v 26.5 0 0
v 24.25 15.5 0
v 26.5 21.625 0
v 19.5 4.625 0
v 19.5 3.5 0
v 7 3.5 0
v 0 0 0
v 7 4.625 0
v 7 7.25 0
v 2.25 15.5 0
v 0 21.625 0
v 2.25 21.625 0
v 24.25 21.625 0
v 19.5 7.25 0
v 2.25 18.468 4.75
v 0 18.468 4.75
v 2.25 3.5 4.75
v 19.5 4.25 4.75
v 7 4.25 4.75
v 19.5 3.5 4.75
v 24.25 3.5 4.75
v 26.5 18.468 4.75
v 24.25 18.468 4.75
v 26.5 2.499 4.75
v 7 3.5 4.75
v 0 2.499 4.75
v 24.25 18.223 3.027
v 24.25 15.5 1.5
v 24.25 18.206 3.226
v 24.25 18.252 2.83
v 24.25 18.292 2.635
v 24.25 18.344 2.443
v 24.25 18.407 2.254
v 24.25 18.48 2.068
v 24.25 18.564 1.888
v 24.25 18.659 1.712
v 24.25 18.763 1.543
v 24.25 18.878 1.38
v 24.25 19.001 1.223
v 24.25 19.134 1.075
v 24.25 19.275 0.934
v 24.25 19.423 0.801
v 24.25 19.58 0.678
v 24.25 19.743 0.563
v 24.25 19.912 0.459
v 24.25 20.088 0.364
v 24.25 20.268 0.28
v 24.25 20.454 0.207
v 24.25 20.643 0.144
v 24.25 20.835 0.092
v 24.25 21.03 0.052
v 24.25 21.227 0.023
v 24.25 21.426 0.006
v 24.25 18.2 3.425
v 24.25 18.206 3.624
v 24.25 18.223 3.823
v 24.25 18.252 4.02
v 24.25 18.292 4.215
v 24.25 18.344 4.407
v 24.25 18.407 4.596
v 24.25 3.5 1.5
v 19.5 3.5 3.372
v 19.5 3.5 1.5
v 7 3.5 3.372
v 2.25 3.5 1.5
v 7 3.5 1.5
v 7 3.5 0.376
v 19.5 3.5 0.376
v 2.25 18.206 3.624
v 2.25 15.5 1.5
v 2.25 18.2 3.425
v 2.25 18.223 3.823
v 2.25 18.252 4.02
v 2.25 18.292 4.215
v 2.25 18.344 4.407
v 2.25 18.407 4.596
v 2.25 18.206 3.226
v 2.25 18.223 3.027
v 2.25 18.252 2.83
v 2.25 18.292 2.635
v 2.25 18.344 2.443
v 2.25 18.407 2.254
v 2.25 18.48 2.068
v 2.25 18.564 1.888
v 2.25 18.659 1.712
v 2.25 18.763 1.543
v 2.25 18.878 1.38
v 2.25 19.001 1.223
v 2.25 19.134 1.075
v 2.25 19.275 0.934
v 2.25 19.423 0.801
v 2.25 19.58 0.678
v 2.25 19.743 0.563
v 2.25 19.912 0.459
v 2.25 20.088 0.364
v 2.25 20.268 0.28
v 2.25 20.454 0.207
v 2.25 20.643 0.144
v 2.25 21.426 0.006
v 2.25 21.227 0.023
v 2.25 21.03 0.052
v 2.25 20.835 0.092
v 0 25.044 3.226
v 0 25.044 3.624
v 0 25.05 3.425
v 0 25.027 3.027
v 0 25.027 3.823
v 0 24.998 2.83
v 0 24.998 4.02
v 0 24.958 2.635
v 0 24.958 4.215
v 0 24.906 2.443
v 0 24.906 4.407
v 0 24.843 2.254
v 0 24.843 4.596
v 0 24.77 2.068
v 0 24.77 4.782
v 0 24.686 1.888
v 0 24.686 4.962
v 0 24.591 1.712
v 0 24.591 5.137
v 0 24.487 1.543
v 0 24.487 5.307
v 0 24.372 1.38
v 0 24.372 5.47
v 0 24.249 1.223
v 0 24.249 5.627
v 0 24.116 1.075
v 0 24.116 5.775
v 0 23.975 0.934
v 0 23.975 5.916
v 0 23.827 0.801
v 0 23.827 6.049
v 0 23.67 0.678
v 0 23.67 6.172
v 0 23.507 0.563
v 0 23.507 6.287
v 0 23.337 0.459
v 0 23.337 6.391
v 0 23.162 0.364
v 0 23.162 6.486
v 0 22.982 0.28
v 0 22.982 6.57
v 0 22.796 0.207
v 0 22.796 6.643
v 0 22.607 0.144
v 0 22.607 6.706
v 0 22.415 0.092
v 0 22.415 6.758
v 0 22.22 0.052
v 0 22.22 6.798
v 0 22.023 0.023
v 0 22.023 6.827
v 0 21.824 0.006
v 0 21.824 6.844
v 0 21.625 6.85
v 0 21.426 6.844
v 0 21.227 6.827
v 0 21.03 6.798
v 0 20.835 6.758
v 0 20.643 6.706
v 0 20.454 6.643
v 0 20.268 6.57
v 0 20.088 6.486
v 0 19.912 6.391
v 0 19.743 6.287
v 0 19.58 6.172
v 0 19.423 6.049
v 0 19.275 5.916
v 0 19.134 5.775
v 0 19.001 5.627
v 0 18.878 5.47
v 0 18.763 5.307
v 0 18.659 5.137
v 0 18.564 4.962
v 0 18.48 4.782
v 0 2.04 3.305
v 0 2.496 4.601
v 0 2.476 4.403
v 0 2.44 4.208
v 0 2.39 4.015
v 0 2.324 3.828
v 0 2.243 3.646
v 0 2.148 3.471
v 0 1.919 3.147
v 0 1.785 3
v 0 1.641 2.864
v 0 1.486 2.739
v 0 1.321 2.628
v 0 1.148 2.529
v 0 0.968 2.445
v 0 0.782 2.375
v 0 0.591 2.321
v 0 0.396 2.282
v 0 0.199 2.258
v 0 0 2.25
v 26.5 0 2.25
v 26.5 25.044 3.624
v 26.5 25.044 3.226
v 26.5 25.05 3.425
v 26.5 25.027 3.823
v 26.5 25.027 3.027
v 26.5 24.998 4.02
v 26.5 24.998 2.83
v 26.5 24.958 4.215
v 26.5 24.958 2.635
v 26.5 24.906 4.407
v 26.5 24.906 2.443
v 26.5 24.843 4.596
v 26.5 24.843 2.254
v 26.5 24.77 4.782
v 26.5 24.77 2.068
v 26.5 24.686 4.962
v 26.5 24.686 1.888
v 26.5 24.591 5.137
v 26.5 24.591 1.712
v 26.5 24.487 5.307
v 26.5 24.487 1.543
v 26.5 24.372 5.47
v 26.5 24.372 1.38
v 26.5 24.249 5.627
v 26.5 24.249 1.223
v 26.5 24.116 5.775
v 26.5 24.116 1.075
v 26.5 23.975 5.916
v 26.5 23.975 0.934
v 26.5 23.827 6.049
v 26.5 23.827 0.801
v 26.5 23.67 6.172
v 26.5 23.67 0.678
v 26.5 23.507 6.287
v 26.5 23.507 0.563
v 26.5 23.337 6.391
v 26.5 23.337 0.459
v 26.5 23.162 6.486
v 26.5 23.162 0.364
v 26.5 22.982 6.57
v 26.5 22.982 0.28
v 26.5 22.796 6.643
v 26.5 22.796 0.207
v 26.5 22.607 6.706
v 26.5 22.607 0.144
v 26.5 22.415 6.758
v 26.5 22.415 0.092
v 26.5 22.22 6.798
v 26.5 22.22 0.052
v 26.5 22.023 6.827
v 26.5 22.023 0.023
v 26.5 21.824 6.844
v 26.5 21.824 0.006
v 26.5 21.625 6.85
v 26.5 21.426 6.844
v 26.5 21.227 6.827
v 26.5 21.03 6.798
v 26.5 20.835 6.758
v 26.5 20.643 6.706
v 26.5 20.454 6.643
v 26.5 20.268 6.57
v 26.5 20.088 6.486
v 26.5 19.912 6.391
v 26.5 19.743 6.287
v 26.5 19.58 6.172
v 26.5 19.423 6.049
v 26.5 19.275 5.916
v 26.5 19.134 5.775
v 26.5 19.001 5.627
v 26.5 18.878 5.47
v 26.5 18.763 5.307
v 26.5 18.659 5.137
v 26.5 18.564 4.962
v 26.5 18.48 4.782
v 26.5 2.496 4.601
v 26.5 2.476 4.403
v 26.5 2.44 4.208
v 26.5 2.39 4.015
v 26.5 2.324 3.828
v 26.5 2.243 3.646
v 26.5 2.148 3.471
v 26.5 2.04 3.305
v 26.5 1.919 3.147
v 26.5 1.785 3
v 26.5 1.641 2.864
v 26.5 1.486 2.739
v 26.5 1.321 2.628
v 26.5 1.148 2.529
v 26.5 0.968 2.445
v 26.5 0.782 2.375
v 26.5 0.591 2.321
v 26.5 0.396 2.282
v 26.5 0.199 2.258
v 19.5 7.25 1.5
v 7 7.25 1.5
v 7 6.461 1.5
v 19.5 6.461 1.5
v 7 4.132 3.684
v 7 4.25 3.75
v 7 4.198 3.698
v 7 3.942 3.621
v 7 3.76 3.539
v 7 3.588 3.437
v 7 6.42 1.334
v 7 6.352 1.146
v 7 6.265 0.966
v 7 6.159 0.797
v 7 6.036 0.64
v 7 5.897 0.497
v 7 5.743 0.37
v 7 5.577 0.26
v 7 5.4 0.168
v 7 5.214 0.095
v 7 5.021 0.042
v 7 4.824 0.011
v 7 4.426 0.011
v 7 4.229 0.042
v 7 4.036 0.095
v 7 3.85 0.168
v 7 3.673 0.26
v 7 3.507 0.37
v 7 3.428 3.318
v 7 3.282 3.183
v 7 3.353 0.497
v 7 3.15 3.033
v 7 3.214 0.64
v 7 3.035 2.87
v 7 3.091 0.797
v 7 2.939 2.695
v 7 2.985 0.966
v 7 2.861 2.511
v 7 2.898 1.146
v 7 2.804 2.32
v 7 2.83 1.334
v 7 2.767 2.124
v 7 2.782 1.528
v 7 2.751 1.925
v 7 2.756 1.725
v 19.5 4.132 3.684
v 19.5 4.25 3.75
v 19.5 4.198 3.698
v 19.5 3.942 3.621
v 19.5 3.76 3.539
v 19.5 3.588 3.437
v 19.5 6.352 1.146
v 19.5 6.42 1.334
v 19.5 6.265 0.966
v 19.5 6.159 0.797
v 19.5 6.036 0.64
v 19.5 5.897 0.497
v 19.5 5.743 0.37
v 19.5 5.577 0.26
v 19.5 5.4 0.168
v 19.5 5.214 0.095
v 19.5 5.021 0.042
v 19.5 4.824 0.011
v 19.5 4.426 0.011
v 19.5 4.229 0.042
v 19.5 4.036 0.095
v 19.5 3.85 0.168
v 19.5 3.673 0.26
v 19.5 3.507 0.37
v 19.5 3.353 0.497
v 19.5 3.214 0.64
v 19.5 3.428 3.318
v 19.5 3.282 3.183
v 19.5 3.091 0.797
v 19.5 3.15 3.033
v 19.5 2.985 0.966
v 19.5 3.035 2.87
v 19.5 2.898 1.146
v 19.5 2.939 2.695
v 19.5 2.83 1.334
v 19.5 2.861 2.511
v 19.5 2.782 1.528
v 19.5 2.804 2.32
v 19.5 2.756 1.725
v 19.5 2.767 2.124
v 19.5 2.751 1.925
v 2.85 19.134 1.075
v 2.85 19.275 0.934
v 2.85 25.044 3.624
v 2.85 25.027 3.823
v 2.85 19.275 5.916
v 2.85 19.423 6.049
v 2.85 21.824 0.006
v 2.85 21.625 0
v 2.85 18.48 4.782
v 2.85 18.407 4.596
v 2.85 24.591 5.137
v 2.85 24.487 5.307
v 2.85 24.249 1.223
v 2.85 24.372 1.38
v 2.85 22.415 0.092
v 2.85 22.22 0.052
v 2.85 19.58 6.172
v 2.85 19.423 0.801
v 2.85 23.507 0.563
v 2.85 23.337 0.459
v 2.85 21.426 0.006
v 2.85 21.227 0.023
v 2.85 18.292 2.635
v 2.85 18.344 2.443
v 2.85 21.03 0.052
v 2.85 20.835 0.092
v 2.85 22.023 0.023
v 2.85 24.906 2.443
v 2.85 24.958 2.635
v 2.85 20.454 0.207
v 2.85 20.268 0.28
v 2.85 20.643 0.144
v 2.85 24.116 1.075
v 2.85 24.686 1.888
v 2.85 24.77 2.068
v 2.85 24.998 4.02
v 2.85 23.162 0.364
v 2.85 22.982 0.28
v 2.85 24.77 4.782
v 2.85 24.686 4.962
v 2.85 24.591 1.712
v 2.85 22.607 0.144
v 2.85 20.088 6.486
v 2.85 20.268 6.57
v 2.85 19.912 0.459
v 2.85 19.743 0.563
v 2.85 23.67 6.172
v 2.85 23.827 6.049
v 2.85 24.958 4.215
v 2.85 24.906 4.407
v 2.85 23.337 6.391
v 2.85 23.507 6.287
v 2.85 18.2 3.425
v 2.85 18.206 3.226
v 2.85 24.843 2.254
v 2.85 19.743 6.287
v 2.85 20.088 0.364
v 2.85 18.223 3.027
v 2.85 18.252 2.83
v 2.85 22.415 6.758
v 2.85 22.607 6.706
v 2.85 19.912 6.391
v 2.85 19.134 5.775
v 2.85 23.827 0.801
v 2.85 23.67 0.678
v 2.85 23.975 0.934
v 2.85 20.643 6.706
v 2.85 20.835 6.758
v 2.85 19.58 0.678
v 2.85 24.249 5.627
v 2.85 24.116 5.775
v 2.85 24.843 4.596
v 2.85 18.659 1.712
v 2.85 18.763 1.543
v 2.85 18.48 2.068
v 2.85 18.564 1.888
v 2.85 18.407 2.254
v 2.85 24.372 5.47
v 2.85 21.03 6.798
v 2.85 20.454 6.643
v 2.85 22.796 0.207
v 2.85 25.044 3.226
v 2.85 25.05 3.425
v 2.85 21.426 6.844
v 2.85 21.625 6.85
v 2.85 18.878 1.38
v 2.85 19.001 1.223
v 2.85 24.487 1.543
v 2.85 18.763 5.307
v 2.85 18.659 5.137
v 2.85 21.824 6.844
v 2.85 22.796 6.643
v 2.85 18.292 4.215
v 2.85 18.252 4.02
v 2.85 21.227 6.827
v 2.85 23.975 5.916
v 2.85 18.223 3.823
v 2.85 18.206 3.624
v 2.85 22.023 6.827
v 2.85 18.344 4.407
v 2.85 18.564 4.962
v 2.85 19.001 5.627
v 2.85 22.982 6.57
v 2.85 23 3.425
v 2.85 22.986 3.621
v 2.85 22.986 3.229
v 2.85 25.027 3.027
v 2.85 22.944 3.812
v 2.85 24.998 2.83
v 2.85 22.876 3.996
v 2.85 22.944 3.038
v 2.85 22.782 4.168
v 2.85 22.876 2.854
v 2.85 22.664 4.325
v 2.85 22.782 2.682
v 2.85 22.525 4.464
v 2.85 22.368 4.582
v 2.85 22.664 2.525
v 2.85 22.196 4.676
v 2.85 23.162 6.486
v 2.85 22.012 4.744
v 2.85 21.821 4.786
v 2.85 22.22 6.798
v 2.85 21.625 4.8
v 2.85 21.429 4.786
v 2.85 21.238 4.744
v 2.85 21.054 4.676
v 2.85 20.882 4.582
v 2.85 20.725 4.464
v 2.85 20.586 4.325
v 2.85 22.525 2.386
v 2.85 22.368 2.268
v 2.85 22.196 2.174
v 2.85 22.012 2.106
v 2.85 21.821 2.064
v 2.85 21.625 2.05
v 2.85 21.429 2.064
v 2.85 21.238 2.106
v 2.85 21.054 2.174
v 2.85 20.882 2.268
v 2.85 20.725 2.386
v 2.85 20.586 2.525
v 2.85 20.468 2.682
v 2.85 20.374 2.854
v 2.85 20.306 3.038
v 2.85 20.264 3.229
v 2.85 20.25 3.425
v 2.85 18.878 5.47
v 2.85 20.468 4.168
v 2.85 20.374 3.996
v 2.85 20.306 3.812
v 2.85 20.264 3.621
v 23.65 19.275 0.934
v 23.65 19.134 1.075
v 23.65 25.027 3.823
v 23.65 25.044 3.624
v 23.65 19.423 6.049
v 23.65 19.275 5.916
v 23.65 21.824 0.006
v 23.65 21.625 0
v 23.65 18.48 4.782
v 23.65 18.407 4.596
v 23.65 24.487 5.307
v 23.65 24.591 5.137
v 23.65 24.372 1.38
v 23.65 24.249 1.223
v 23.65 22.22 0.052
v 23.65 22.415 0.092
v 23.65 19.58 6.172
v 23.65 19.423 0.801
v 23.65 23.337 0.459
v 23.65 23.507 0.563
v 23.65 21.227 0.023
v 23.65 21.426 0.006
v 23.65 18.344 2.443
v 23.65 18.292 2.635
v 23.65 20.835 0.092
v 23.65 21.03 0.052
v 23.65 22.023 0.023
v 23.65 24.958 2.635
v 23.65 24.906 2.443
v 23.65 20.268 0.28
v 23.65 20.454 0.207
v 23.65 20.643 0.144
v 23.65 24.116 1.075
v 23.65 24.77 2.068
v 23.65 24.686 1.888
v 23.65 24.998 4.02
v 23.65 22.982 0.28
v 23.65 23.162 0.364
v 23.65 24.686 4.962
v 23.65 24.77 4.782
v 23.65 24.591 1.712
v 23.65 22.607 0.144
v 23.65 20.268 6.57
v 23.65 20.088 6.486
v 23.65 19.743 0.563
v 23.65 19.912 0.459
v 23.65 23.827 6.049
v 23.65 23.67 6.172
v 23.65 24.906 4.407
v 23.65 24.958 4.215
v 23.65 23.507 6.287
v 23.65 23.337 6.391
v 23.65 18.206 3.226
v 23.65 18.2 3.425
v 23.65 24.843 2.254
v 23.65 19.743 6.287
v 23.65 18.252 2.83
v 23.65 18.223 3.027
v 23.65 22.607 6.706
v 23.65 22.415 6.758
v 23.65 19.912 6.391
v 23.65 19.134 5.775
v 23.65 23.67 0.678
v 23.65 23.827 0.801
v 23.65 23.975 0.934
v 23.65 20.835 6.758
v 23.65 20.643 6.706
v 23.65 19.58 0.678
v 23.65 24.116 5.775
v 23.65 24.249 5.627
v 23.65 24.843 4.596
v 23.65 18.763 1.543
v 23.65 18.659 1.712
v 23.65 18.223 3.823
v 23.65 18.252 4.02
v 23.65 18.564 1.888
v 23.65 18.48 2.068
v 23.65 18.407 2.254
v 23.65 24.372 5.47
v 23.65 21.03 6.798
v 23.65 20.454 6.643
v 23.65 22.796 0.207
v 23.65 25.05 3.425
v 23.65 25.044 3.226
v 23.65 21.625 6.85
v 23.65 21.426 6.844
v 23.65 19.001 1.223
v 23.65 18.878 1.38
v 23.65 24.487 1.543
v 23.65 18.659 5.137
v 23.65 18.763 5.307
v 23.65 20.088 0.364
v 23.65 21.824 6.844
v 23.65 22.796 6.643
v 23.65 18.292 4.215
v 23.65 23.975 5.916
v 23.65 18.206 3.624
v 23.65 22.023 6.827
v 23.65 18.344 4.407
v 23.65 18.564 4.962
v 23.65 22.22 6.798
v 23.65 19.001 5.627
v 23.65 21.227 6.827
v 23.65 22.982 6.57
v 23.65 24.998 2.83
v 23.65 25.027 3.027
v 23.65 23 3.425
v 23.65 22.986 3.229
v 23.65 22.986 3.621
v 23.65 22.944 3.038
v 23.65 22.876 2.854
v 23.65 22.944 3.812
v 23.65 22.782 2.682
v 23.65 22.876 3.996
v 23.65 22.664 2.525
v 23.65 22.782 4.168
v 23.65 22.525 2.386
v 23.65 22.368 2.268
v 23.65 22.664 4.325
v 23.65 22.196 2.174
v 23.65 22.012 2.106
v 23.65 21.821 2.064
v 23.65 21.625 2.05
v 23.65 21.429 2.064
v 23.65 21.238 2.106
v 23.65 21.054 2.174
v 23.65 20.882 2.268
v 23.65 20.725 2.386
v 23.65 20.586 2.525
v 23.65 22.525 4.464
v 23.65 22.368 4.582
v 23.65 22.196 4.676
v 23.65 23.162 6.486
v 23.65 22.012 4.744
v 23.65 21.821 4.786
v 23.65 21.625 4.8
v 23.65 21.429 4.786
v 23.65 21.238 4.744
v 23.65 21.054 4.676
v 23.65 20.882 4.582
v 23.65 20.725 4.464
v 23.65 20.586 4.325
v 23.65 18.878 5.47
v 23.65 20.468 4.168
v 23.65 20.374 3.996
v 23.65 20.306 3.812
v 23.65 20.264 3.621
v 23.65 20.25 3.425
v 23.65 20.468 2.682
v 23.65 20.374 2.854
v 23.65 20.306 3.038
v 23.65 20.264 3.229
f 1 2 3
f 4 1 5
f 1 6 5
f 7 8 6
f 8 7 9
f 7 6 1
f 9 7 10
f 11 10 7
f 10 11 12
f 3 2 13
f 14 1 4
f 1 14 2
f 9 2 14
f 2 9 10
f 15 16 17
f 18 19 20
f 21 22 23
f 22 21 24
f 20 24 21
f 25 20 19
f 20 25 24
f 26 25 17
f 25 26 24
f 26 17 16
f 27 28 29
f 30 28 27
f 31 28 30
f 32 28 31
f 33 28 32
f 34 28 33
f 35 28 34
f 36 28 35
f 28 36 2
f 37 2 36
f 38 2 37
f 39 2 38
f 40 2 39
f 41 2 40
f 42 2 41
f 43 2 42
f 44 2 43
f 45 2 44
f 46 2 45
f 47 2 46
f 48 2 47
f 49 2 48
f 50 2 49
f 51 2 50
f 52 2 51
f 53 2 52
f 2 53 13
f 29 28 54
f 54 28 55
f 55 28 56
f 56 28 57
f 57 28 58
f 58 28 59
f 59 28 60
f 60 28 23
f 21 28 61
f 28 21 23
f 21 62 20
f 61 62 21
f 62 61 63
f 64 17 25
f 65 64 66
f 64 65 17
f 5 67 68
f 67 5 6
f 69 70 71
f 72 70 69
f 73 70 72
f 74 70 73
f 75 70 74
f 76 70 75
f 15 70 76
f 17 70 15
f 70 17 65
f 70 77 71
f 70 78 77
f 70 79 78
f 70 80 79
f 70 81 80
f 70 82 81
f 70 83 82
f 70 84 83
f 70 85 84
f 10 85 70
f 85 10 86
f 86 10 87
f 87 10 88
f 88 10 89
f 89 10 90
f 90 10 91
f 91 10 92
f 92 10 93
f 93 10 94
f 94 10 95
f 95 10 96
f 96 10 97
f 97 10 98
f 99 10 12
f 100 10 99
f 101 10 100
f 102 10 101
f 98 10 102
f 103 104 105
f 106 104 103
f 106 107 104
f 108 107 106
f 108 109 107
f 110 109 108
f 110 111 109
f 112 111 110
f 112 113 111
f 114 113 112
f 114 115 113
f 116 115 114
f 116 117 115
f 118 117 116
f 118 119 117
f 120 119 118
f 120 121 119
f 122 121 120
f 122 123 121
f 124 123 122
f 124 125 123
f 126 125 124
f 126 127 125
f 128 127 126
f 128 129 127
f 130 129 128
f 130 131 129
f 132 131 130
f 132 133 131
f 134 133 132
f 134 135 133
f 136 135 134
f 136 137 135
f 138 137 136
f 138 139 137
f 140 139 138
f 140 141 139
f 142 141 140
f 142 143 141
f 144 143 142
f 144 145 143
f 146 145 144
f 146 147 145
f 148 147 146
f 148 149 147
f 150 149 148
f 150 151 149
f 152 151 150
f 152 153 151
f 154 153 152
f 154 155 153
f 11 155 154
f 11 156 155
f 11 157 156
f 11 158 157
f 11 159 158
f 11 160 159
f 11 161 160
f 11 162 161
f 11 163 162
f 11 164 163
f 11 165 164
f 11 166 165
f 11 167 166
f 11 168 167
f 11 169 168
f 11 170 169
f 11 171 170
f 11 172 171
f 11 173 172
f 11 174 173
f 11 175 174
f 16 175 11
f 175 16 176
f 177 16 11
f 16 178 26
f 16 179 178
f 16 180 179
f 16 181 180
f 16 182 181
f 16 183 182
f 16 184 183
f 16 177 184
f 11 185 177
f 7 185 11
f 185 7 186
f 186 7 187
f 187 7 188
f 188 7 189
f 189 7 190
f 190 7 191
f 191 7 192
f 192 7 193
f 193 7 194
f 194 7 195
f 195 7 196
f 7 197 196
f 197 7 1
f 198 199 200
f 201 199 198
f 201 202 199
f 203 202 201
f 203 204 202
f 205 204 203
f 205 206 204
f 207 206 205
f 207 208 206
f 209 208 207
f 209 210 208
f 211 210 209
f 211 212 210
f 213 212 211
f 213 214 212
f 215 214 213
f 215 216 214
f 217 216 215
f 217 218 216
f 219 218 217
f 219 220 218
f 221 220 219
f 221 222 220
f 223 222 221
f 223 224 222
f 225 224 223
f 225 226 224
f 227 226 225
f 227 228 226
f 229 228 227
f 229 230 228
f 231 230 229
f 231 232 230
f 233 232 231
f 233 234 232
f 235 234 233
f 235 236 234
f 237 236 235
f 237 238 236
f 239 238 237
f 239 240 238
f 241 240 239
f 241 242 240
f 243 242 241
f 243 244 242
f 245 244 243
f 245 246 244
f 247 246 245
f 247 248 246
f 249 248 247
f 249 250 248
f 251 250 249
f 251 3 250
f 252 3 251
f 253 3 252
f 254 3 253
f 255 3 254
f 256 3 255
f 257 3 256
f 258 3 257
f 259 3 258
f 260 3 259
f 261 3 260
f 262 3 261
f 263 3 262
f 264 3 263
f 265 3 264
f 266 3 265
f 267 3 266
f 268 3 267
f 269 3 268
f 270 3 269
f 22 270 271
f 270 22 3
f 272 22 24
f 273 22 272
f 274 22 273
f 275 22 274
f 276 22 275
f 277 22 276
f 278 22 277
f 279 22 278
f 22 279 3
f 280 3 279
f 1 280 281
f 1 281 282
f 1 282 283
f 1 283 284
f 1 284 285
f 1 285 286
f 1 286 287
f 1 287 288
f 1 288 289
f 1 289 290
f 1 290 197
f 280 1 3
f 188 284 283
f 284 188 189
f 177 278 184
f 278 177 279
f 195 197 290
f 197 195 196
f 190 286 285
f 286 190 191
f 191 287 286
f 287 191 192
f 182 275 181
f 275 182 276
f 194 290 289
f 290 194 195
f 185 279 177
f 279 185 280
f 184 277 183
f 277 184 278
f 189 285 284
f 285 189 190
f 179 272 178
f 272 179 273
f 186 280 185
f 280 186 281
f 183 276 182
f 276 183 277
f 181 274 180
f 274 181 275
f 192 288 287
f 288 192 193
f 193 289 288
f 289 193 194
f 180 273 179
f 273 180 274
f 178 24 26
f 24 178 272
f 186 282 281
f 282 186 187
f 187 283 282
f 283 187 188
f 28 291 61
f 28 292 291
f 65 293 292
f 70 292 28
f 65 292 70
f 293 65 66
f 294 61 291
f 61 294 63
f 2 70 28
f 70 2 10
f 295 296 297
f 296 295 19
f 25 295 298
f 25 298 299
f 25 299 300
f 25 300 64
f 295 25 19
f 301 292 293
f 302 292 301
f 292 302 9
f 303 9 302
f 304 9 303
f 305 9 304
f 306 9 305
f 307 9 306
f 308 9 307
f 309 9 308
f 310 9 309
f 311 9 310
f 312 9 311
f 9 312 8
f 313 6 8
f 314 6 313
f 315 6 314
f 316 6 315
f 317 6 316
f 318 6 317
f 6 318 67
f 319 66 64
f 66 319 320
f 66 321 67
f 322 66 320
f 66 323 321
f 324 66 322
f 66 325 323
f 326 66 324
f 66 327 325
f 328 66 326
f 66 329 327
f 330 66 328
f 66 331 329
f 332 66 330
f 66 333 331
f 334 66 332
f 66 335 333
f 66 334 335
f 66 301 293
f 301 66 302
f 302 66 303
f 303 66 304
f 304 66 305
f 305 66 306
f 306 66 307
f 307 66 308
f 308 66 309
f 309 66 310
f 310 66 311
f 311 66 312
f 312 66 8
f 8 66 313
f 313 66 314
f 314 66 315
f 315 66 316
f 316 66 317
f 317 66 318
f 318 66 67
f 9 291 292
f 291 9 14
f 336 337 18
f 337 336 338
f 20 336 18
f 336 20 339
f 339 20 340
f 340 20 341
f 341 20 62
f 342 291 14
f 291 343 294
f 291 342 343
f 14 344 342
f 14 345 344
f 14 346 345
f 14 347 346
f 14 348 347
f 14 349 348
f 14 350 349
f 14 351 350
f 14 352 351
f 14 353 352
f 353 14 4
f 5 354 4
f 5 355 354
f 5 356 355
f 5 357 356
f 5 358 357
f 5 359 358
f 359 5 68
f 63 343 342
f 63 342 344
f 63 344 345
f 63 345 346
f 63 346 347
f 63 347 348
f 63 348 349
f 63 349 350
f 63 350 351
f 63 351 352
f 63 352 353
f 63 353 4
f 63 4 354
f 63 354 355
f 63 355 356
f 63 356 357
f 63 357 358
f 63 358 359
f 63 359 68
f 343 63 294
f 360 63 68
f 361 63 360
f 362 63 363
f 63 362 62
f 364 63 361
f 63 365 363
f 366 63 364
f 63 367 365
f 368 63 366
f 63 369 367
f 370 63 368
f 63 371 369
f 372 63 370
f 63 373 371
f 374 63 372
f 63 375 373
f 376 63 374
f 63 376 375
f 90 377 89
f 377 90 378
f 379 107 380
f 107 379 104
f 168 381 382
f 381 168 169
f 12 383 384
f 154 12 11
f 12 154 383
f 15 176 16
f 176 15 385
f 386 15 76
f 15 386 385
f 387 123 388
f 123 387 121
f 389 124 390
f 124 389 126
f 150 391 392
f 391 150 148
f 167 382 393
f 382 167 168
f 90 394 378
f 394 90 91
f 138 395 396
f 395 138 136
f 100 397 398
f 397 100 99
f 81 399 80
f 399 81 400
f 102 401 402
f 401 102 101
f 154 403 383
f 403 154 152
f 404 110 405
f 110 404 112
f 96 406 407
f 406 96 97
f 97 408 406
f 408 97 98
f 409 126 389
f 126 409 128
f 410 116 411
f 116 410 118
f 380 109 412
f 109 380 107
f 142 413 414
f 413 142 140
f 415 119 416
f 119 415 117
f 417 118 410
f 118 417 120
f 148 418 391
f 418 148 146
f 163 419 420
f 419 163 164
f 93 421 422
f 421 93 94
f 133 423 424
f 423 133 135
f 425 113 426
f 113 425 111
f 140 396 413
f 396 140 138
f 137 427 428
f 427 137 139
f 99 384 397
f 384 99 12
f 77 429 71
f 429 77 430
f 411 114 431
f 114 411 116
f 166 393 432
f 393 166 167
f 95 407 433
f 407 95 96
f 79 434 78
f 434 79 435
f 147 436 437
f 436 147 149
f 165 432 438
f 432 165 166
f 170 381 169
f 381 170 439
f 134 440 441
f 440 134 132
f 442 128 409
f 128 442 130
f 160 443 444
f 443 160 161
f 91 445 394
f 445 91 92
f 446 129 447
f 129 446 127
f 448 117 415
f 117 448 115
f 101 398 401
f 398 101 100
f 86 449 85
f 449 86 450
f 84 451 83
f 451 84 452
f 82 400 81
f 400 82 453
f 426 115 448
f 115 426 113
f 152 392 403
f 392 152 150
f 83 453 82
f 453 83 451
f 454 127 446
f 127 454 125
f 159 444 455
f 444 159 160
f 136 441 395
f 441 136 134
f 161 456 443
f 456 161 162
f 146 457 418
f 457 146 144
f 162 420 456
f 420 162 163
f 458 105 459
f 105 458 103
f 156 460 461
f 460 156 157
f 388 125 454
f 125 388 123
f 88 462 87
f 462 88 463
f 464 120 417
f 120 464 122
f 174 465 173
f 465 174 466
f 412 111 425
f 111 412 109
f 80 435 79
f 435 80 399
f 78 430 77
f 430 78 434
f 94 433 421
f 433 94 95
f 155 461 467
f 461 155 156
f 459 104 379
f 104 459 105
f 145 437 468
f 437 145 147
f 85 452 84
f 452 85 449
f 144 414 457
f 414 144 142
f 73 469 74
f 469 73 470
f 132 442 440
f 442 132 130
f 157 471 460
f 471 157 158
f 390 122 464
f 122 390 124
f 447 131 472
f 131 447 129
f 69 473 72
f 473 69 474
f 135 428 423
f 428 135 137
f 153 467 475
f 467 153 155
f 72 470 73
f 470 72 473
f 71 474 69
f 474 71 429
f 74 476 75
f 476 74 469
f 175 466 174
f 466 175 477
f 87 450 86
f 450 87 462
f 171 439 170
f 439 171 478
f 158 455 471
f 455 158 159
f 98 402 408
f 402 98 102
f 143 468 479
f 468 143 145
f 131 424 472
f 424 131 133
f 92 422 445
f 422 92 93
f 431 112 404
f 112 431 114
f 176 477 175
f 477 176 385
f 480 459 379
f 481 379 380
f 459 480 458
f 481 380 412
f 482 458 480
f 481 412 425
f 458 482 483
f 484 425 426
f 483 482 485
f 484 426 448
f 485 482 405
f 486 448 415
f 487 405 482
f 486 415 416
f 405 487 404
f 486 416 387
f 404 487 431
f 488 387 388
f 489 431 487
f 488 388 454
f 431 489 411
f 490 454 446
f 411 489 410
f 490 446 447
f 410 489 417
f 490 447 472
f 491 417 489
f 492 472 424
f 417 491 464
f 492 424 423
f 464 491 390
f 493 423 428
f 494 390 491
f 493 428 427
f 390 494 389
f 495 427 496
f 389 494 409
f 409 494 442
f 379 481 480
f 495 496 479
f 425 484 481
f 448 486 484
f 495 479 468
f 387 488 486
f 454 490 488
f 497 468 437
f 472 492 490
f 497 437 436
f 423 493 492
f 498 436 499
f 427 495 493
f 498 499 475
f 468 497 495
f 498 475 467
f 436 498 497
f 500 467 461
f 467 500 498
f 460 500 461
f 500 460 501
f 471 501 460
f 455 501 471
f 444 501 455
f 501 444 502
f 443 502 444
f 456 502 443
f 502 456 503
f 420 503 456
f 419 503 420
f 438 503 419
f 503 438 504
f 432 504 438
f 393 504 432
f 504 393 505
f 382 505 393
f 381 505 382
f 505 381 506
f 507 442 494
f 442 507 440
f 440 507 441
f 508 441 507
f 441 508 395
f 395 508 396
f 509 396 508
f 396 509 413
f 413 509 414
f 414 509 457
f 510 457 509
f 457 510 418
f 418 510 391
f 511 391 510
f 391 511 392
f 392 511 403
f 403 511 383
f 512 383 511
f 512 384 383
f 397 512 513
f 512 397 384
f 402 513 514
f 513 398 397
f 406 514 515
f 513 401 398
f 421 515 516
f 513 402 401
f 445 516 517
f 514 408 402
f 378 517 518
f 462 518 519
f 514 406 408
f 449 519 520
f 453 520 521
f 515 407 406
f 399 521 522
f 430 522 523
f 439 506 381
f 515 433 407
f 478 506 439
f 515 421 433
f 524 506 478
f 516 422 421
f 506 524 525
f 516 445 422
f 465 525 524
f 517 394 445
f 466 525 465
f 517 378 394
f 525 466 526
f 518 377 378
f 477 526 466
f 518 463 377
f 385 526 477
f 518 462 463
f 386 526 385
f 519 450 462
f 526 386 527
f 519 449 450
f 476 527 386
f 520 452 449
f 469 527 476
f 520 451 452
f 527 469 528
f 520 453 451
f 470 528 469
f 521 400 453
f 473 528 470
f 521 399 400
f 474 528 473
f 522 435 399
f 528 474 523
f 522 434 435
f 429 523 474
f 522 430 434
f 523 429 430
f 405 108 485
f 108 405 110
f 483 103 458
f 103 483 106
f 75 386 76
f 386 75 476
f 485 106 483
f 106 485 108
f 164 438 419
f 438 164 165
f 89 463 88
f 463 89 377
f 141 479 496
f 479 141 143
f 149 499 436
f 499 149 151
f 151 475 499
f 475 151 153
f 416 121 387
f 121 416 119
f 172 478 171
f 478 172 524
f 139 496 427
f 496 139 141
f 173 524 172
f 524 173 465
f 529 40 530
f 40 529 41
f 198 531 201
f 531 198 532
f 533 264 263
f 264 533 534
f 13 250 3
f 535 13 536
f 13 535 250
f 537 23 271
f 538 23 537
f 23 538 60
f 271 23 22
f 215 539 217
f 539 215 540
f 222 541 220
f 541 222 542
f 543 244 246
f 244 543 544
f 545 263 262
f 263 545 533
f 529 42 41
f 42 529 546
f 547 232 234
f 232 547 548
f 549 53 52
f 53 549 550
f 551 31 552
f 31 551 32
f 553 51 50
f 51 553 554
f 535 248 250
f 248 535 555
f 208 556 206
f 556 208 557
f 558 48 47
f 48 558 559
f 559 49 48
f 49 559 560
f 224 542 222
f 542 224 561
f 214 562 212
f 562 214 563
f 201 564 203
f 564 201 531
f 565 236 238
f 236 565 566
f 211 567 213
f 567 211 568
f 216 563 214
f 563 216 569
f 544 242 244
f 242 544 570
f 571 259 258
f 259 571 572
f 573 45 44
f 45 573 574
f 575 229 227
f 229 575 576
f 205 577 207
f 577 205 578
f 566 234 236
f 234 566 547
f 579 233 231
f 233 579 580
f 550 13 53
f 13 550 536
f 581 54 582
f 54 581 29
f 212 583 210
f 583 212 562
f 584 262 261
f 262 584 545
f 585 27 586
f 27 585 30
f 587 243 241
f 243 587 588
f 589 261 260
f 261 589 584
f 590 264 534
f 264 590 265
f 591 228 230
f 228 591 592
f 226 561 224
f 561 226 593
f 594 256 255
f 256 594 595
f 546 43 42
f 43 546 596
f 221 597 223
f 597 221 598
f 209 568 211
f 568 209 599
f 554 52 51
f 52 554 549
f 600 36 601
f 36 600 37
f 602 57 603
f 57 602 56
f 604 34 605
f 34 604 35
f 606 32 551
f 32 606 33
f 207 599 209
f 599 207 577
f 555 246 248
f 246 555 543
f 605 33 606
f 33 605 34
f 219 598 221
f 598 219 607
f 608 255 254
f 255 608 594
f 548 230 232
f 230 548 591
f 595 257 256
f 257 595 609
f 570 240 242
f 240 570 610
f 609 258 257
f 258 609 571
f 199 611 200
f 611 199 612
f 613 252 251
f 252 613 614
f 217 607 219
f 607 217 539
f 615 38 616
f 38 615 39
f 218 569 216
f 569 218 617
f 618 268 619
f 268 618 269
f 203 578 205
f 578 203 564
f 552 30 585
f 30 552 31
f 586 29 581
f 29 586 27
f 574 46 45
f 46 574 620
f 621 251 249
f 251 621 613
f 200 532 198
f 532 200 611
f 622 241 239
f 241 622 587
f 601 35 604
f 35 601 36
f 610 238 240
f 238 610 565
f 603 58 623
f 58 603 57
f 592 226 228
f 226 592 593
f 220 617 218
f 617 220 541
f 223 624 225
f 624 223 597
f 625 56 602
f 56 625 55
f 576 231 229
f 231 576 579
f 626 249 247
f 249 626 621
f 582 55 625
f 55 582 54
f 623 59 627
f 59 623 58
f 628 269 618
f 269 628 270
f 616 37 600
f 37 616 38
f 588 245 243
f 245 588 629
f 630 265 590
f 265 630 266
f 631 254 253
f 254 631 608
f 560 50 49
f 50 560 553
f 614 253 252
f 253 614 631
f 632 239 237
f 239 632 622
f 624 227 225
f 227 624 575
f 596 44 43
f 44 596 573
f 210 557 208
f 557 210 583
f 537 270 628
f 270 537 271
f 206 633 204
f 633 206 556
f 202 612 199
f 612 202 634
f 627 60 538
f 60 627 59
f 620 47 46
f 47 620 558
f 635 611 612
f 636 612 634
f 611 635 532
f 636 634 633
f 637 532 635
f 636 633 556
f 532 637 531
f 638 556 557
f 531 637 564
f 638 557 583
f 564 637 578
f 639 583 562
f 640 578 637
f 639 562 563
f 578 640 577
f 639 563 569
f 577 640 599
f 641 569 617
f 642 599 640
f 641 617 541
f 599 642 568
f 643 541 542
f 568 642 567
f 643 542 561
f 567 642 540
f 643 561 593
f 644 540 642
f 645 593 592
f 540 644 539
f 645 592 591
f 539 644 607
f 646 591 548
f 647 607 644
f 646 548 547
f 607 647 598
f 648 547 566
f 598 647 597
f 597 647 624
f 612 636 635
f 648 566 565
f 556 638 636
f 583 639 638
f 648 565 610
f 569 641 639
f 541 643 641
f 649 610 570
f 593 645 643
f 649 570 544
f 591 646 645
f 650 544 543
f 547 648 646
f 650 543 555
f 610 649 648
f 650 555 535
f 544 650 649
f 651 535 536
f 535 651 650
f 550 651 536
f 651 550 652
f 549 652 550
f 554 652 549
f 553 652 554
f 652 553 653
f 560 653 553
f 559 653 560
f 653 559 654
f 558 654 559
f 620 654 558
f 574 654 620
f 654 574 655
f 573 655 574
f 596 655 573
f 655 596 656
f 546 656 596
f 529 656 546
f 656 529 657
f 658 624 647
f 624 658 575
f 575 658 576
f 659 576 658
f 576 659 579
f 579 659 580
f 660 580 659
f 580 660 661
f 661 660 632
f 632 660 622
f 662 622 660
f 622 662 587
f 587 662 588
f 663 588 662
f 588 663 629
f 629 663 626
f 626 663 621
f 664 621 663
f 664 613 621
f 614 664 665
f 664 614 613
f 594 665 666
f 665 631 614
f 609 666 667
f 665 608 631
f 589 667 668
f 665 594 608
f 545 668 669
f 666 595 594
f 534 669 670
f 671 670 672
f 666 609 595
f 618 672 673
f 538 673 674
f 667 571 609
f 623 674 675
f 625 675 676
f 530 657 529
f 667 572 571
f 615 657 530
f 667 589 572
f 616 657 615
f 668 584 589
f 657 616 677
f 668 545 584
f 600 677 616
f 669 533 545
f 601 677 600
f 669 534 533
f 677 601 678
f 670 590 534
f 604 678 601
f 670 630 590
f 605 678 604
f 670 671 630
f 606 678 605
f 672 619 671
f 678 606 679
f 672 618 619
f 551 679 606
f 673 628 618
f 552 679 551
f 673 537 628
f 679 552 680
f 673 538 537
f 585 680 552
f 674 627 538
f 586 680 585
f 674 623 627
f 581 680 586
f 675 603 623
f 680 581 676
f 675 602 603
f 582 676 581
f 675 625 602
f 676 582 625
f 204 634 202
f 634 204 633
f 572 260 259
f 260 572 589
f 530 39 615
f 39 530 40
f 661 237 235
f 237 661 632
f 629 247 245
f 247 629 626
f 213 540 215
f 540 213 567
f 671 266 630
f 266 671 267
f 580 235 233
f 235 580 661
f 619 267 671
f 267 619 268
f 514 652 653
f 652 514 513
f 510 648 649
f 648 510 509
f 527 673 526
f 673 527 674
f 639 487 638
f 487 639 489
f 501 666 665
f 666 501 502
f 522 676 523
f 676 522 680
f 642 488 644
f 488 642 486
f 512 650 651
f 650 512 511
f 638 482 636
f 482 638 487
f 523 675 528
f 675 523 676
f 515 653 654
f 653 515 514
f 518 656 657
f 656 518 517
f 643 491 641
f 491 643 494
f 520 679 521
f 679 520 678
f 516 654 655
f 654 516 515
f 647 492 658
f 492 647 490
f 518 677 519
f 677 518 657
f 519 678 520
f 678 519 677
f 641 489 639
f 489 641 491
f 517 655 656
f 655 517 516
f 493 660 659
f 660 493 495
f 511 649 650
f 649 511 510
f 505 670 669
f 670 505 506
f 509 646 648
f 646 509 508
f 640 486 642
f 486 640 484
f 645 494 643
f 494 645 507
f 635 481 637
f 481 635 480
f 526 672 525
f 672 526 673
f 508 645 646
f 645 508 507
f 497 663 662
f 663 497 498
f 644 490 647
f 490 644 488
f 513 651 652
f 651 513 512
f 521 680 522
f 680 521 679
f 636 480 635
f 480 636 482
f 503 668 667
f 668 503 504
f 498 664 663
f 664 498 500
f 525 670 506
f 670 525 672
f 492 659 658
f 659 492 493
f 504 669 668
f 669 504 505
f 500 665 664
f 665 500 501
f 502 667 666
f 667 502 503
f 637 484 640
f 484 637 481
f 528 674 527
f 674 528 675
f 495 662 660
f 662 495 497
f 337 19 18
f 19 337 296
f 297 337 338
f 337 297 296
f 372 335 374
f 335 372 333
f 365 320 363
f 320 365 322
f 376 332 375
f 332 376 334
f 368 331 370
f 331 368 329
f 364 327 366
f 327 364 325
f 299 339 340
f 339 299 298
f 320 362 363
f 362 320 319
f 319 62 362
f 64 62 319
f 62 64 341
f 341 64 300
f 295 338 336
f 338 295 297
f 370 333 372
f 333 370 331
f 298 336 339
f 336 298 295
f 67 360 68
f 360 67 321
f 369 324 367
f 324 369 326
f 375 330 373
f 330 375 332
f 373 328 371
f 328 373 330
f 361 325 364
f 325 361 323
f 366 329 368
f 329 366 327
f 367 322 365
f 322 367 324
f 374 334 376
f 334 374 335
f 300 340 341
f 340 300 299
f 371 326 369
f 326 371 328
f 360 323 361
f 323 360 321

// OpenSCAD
//cylinder(d = 2.7, h = );

$fa = 0.2;
$fs = 0.2;

z_thickness = 1.5;
base_dim = [26.5, 15.5];
hole_dim = [12.5, 3.75];

hole_offset = [(base_dim[0] - hole_dim[0]) / 2, 3.5];

grip_dim = [19.5, 1.5];


mount_d = 2.75;
mount_dim = [base_dim[0], 23 - mount_d/2, 4.75];
mount_wall_thickness = 2.25;//_offset = [2.25, hole_offset[1]];
mount_cut_r = 2.5;
mount_holder_d = 6.85;
mount_holder_h = 2.85;

mount_clip_height = 4.5 - grip_dim[1]/2;
mount_clip_width = 0.75;

module grip_sphere() {
    intersection() {
        sphere(d = grip_dim[1]);
        
        translate([-grip_dim[1]/2, -grip_dim[1]/2,-grip_dim[1]/2])
        cube([grip_dim[1], grip_dim[1], grip_dim[1]/2]);
    }
}

module grip() {
    hull() {
        grip_sphere();
        translate([grip_dim[0], 0])
        grip_sphere();
    }
}

difference() {

union() {

    linear_extrude(z_thickness)
    difference() {
        square(base_dim);
        translate(hole_offset)
        square(hole_dim);
    }

    *translate([(base_dim[0] - grip_dim[0]) / 2,hole_offset[1],0]) {
        translate([0,-grip_dim[1]/2,0])
        grip();

        translate([0,hole_dim[1]+grip_dim[1]/2,0])
        grip();
    }


    difference() {
        
        linear_extrude(mount_dim[2])
        difference() {
            square([mount_dim[0], mount_dim[1]]);
            translate([mount_wall_thickness, hole_offset[1]])
            square([mount_dim[0] - mount_wall_thickness*2, mount_dim[1]]);
        }
        
        translate([0,0,mount_dim[2]])
        rotate([0,90,0])
        translate([0,0,-1])
        cylinder(r = mount_cut_r, h = mount_dim[0] + 2);
    }

    translate([0,mount_dim[1],mount_holder_d/2])
    rotate([0,90,0])
    cylinder(d = mount_holder_d, h = mount_holder_h);
    
    translate([mount_dim[0] - mount_holder_h,mount_dim[1],mount_holder_d/2])
    rotate([0,90,0])
    cylinder(d = mount_holder_d, h = mount_holder_h);
    
    translate([0,mount_dim[1],mount_holder_d/2])
    rotate([0,90,0])
    cylinder(d = mount_d, h = mount_dim[0]);
    
    translate([hole_offset[0], hole_offset[1],mount_clip_height-mount_clip_width])
    rotate([90,0,90])
    linear_extrude(hole_dim[0])
    polygon([[0,0],[mount_clip_width, mount_clip_width],[mount_clip_width,mount_dim[2] - mount_clip_height+mount_clip_width], [0,mount_dim[2] - mount_clip_height+mount_clip_width]]);


}

    translate([hole_offset[0], hole_offset[1]+mount_clip_height/2-mount_clip_width, mount_clip_height/2])
    rotate([0,90,0])
    cylinder(d = mount_clip_height, h = hole_dim[0]);

}
